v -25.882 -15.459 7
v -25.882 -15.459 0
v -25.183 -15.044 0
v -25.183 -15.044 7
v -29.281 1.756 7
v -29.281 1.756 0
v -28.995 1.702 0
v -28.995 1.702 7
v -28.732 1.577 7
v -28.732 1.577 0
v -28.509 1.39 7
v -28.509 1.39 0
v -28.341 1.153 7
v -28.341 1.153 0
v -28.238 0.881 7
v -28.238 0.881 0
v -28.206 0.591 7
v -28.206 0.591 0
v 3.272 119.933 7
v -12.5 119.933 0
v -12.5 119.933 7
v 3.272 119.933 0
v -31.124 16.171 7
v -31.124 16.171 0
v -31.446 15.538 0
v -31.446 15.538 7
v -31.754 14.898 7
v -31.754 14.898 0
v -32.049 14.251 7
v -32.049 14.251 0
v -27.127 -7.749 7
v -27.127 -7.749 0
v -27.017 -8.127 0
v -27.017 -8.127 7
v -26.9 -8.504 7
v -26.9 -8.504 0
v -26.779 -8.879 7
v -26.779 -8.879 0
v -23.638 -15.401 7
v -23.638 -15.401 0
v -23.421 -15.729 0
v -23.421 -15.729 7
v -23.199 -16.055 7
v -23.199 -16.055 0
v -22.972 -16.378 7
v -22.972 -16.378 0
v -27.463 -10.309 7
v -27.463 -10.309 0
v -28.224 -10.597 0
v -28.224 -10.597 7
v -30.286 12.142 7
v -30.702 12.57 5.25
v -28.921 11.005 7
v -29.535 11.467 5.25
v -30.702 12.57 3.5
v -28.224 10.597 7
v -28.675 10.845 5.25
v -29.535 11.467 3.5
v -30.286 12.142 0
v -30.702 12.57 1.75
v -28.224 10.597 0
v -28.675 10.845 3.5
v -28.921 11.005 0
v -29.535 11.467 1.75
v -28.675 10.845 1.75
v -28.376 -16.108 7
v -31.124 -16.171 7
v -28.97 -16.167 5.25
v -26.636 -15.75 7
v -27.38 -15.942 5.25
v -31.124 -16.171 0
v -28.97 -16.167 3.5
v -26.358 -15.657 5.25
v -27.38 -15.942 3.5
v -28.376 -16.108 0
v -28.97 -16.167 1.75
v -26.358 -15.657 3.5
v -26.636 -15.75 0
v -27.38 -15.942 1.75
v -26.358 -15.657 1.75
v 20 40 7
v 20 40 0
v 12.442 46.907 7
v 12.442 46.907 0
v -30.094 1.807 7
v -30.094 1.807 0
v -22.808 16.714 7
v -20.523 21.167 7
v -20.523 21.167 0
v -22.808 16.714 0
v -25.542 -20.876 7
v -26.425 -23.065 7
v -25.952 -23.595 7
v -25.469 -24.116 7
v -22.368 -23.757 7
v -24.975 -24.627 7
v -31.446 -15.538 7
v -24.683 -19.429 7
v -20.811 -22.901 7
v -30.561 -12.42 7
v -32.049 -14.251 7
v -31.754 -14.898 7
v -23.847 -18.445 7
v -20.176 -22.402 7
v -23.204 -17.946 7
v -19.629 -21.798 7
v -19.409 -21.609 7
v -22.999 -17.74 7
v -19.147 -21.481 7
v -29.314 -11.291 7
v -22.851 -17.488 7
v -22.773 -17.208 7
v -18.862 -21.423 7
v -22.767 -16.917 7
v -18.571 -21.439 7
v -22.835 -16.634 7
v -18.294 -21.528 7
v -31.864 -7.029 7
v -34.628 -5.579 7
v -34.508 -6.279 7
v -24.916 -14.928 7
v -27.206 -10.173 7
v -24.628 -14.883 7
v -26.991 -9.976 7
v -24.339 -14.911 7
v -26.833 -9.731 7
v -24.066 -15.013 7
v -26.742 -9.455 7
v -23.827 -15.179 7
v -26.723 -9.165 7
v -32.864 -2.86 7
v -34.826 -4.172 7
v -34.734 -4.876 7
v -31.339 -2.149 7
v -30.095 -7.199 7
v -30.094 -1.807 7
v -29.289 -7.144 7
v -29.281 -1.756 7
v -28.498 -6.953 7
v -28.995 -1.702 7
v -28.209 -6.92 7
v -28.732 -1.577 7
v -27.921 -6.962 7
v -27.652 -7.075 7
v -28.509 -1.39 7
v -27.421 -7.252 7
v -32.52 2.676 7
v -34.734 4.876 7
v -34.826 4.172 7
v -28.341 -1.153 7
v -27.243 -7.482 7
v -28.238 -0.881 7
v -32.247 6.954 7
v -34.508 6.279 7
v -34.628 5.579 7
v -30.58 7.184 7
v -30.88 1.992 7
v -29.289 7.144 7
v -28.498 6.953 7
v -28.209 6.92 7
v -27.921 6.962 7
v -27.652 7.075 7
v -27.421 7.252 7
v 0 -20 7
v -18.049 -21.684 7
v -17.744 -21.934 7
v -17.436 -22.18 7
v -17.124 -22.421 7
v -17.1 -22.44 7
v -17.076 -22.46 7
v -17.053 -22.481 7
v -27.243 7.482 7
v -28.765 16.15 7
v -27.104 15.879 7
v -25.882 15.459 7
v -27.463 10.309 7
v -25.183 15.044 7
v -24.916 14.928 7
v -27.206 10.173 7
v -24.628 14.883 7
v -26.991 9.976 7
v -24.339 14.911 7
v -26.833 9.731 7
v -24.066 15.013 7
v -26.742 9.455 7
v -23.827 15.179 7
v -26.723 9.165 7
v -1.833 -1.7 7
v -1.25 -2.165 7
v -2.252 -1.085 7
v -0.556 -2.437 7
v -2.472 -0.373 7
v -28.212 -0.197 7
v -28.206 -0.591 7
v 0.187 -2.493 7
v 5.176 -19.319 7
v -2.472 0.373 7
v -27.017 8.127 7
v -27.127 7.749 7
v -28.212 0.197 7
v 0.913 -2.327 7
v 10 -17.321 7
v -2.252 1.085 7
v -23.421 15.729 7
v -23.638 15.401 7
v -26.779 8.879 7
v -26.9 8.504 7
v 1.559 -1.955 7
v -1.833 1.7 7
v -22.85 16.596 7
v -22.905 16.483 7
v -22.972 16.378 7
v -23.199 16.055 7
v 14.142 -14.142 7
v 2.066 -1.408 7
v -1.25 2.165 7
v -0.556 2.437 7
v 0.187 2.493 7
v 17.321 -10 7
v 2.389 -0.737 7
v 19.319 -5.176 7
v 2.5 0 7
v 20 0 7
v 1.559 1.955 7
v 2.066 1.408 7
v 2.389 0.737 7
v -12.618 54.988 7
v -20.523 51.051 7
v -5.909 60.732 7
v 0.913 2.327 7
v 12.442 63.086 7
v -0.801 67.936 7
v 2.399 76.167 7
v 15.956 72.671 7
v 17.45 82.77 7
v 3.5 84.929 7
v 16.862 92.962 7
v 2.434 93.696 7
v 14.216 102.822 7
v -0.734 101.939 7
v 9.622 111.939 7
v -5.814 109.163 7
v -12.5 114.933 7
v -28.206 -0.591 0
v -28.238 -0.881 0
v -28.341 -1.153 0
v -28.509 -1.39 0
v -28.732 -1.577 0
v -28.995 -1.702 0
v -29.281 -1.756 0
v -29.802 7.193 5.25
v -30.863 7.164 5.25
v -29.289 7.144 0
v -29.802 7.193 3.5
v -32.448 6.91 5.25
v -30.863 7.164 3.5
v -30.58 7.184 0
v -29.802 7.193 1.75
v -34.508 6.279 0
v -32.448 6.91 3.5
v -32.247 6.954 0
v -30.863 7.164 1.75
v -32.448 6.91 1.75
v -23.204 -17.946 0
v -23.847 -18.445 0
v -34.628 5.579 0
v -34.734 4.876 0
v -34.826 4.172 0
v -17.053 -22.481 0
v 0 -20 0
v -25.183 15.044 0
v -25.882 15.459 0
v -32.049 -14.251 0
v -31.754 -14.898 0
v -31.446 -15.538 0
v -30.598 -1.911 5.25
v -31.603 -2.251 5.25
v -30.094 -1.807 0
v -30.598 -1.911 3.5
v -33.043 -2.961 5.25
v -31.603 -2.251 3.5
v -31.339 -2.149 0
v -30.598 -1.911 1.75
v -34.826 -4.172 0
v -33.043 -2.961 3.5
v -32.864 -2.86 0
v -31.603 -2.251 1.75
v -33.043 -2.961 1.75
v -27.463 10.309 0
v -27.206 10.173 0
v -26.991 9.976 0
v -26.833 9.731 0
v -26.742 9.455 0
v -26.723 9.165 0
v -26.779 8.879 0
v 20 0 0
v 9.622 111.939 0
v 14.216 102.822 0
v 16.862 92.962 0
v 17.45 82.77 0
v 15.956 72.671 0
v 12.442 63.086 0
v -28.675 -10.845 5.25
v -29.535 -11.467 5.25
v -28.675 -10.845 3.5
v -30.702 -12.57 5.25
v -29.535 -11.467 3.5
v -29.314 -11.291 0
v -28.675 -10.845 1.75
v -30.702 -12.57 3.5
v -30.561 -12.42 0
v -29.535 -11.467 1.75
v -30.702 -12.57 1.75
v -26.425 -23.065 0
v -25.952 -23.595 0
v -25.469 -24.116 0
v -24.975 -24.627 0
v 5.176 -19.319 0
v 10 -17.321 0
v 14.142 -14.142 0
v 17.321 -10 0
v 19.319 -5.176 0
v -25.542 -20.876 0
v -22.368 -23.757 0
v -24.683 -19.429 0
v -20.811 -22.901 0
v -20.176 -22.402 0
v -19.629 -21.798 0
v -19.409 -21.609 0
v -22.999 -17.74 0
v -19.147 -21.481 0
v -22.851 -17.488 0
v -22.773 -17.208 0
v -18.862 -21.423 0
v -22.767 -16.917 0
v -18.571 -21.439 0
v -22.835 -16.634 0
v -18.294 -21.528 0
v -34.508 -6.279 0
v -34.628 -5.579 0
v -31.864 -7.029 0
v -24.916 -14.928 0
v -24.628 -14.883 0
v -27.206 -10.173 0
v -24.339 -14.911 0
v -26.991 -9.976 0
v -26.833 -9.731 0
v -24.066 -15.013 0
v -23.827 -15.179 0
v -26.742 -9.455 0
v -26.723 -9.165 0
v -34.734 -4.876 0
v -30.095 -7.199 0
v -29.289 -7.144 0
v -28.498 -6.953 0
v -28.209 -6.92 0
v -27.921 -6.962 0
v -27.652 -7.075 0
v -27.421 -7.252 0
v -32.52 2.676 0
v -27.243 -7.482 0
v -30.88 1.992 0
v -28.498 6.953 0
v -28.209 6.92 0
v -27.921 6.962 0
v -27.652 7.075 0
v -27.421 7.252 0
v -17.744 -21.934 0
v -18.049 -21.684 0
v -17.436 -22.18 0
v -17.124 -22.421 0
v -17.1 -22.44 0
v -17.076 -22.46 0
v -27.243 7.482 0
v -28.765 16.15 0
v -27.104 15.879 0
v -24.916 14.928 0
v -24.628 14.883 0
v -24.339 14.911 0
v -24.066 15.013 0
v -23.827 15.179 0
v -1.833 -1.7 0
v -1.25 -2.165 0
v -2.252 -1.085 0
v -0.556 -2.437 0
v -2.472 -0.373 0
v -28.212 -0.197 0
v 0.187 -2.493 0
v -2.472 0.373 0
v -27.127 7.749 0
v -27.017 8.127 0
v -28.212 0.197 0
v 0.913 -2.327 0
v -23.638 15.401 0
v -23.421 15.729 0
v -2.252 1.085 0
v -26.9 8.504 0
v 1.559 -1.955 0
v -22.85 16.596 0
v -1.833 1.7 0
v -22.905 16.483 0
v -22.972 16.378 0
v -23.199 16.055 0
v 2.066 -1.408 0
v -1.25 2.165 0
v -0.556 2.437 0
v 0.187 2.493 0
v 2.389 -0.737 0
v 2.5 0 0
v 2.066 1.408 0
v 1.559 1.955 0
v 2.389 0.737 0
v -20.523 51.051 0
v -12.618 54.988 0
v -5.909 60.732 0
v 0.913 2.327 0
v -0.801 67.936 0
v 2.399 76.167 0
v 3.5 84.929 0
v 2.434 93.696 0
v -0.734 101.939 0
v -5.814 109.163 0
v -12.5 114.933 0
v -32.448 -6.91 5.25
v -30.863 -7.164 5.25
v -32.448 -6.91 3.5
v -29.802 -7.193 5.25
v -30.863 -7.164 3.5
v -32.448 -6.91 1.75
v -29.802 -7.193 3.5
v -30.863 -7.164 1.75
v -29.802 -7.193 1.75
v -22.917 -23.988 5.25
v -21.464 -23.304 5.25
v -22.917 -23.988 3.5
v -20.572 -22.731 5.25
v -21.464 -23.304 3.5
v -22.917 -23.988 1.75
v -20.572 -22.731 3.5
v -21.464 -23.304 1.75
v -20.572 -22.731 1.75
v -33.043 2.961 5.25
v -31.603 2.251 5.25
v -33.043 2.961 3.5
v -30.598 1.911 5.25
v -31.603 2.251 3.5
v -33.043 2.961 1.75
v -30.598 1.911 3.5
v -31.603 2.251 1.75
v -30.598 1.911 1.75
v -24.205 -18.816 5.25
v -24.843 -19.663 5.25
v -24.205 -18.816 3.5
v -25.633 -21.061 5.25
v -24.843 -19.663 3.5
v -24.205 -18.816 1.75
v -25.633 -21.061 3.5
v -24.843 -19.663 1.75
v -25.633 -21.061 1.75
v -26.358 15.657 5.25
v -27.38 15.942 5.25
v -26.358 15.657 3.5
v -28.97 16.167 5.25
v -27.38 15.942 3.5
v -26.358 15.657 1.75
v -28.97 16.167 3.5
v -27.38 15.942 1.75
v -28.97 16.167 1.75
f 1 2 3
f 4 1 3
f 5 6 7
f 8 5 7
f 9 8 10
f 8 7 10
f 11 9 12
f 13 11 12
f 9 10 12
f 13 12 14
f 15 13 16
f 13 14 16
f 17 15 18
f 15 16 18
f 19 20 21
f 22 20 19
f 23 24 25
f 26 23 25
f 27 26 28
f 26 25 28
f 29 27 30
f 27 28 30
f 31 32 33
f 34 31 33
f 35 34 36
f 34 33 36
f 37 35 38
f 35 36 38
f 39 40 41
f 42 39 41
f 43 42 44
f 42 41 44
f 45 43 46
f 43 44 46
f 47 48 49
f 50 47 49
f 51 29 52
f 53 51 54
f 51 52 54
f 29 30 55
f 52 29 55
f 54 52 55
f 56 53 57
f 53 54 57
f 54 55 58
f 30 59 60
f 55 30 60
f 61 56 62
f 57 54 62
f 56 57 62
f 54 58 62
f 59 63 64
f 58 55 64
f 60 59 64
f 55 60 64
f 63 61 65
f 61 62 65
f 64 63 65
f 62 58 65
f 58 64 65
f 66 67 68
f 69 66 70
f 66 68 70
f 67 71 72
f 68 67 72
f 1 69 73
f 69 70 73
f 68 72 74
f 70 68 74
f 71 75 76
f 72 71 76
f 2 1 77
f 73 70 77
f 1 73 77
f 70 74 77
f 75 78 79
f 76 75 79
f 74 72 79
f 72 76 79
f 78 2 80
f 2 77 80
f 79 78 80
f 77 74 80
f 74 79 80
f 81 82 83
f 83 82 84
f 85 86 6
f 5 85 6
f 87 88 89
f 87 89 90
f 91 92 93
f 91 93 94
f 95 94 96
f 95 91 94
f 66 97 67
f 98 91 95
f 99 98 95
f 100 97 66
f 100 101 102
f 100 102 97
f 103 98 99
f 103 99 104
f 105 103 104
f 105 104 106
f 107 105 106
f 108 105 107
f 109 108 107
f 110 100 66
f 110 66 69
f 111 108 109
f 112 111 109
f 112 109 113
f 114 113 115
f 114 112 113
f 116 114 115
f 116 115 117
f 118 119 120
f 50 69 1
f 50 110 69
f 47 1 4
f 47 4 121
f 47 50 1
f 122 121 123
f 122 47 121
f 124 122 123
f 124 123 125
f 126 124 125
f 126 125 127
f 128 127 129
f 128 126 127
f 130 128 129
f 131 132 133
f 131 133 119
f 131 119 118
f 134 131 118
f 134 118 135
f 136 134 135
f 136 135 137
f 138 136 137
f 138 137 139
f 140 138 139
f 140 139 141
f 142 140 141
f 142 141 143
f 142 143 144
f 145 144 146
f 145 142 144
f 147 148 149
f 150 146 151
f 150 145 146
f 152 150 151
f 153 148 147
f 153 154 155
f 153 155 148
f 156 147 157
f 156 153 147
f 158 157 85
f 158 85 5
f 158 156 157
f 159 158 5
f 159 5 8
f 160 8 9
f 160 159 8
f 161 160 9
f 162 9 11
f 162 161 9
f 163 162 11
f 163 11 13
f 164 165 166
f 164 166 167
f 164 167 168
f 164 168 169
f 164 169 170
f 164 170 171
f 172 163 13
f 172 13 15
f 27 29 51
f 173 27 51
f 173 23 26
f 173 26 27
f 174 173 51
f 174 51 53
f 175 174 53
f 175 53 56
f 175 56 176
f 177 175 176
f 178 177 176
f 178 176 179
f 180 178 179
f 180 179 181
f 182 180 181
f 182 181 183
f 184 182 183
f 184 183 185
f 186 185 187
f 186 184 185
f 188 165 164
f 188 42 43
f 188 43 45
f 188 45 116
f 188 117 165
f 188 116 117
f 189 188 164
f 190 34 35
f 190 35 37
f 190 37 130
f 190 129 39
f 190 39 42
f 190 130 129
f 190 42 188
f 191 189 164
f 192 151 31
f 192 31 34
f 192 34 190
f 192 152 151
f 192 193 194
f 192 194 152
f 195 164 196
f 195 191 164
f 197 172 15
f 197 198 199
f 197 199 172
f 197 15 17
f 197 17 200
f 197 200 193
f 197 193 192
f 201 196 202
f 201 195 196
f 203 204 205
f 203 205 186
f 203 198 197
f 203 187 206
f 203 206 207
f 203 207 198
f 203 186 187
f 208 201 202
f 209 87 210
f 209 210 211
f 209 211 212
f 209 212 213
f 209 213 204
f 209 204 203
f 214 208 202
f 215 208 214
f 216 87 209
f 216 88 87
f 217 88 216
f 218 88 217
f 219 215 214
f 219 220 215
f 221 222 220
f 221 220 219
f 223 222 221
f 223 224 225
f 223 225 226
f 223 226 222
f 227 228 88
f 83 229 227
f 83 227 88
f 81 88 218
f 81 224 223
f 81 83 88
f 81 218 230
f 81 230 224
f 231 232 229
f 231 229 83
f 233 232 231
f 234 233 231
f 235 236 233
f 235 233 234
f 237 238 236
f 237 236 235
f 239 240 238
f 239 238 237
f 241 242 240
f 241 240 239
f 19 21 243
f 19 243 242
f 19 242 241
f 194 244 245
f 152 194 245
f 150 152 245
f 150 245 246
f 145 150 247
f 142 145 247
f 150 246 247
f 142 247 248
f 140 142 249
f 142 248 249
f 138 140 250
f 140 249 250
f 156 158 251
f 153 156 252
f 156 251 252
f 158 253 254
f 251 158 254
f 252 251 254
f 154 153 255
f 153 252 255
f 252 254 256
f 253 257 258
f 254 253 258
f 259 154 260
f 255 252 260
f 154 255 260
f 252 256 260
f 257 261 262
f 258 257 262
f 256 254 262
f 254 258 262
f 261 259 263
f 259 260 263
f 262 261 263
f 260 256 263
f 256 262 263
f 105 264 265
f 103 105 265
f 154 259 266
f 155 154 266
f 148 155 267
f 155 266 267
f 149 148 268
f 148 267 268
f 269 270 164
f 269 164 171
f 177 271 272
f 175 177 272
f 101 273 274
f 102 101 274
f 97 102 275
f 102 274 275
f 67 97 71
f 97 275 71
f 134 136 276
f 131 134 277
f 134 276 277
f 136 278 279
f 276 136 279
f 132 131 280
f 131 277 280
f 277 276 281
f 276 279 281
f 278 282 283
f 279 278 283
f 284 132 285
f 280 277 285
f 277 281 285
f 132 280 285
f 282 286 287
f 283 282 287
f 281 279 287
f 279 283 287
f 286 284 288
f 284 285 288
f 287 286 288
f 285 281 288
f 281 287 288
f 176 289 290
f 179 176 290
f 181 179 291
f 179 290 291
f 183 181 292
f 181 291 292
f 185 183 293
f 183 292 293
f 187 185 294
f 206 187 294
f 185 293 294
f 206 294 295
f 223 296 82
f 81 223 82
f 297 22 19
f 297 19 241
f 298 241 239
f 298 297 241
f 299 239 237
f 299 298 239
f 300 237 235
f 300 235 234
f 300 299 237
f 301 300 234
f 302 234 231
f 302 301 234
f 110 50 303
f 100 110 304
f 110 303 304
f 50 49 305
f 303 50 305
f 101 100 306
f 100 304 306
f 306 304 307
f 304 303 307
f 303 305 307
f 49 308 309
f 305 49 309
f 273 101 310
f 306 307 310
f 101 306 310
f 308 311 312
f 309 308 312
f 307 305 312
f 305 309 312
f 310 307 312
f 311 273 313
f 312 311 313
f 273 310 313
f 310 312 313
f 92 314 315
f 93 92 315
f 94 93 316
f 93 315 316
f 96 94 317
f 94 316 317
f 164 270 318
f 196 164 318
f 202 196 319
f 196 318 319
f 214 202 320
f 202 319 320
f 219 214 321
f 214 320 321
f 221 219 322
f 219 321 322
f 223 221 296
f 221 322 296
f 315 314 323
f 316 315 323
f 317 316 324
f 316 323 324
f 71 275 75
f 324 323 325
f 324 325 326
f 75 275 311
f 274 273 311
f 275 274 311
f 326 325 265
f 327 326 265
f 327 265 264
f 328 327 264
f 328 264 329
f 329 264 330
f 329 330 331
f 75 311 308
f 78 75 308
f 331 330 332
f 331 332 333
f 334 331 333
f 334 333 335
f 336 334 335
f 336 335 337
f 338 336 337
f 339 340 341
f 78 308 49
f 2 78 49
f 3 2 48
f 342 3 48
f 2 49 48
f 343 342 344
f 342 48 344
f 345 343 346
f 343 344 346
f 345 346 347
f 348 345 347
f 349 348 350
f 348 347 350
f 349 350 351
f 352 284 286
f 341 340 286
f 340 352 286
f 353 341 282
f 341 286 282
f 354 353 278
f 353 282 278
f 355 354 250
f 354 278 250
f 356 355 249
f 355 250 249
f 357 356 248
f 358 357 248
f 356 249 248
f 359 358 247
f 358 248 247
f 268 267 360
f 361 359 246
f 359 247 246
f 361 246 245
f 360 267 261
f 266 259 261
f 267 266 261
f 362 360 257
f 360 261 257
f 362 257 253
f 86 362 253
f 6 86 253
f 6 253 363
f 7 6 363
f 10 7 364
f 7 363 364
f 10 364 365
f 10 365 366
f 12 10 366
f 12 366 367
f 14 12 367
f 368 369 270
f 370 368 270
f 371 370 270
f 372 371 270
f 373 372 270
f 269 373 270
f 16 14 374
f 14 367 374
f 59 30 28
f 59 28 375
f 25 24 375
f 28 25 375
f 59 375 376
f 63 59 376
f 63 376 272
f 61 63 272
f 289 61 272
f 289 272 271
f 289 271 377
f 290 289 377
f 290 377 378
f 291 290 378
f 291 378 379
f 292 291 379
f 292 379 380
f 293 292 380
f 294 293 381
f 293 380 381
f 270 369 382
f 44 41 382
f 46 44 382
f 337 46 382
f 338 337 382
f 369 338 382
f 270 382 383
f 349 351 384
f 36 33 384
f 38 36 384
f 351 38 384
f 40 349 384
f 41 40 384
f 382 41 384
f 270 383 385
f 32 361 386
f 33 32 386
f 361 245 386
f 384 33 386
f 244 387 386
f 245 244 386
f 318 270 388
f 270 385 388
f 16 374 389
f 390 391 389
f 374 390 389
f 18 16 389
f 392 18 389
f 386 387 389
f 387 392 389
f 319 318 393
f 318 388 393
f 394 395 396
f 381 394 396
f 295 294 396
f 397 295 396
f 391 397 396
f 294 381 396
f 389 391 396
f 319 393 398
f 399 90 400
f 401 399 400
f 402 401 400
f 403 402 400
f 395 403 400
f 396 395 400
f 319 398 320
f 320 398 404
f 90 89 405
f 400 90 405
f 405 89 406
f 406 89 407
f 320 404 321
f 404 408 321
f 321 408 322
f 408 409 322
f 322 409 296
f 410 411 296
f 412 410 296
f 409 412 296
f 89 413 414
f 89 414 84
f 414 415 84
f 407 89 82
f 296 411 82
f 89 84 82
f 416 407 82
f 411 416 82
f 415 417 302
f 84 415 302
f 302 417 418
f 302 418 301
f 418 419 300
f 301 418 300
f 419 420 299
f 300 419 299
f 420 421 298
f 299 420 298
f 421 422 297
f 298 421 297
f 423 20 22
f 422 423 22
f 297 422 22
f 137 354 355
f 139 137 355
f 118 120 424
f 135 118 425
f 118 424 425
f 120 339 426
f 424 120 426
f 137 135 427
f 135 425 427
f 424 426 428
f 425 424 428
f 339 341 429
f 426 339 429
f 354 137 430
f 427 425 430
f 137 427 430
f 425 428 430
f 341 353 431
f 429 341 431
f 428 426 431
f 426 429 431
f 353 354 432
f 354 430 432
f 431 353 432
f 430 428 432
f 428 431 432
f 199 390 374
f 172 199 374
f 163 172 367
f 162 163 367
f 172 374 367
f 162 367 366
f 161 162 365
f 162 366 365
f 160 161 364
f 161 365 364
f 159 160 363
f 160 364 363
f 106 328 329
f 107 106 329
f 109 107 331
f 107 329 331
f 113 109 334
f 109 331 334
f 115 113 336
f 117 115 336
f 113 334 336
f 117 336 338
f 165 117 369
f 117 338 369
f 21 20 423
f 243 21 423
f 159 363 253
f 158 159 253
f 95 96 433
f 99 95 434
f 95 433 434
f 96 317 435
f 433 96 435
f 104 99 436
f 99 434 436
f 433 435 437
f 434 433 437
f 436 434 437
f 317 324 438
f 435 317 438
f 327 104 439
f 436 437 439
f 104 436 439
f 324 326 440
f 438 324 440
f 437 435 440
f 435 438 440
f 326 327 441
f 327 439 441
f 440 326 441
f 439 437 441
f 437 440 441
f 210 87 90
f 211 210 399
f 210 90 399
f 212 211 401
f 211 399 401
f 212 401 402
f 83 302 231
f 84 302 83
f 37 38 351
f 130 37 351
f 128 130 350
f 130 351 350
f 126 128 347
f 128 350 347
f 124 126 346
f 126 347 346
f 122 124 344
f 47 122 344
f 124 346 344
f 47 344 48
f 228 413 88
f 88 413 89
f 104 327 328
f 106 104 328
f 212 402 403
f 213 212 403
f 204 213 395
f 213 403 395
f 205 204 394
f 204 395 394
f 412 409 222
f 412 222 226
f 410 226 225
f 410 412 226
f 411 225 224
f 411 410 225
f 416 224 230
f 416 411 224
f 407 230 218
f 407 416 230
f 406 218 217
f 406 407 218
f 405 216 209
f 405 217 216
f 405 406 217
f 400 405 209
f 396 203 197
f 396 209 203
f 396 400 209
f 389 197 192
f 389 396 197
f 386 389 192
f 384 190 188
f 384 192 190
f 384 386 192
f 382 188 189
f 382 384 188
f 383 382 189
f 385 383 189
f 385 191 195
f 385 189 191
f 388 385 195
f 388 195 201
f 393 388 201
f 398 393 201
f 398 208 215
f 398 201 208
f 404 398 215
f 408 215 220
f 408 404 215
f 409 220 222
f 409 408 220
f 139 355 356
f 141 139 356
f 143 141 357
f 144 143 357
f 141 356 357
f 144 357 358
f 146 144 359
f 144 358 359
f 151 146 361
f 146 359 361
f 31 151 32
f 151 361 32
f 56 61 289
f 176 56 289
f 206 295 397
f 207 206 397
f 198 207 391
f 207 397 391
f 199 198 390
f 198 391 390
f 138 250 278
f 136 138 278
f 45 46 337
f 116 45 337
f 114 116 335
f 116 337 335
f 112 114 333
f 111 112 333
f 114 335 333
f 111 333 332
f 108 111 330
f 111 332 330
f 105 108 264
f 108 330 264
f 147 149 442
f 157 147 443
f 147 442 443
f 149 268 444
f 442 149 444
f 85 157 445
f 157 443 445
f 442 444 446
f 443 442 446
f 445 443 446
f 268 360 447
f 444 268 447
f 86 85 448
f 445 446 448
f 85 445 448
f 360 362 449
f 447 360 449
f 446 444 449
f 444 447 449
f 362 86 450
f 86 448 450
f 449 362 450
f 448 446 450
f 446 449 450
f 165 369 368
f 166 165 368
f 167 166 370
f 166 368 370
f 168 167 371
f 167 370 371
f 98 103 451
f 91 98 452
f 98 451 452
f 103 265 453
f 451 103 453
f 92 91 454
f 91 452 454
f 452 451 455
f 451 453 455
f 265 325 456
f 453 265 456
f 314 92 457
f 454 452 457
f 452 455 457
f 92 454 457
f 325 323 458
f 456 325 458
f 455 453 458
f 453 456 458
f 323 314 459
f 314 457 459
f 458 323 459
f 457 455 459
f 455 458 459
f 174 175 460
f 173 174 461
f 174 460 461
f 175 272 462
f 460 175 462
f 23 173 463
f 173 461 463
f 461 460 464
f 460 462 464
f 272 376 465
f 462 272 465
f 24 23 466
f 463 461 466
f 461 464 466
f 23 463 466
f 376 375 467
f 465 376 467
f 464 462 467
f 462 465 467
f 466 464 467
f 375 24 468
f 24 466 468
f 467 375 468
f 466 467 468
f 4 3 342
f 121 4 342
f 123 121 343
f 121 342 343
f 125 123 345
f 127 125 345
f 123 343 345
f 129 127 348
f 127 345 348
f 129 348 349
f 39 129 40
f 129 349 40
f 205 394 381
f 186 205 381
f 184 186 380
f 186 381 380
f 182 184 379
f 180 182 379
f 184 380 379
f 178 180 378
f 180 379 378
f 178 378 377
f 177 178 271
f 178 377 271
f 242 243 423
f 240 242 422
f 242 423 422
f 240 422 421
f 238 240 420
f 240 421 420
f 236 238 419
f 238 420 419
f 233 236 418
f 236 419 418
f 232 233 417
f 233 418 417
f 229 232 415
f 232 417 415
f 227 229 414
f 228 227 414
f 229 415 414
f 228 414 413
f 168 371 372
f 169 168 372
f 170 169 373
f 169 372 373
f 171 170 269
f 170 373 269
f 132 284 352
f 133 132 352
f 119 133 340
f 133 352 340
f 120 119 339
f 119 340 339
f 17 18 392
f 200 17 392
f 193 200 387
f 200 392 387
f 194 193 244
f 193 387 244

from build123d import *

# Parameters (mm, degrees)
PAD005_DEPTH      = 10
CYLINDER001_R     = 2.5
CYLINDER001_DEPTH = 30
PAD_DEPTH         = 7
PAD001_DEPTH      = 7


with BuildPart() as gearcutter_d:
    # Sketch007 → Pad005 (new body)
    with BuildSketch(Plane.XY):
        with BuildLine():
            Line((20, 31.95888), (45.304215, 31.95888))
            Line((45.304215, 31.95888), (45.304215, -33.652056))
            Line((45.304215, -33.652056), (23.213182, -33.652056))
            Line((-17.372387, -39.01239), (23.213182, -33.652056))
            Line((-25.984375, -33.578197), (-17.372387, -39.01239))
            Line((-17.23691, -22.507347), (-25.984375, -33.578197))
            Line((7e-06, -20), (-17.23691, -22.507347))
            ThreePointArc((7e-06, -20), (14.142138, -14.142133), (20, 0))
            Line((20, 0), (20, 31.95888))
        make_face()
        Polygon((-20, 22.185684), (-22.978563, 16.381247), (-30, 23.81991), (-24.00174, 30), align=None)
    extrude(amount=PAD005_DEPTH)


with BuildPart() as hole:
    # Cylinder001 → Cylinder001 (new body)
    with BuildSketch(Plane.XY.offset(-10)):
        Circle(CYLINDER001_R)
    extrude(amount=CYLINDER001_DEPTH)


with BuildPart() as cut002:
    # InvoluteGear → Pad (new body)
    with BuildSketch(Plane.XY):
        with BuildLine():
            Line((29.216017, -2.627852), (30.02668, -2.698596))
            add(Edge.make_bspline(
                [(30.02668, -2.698596), (30.269336, -2.702327), (31.240634, -2.684194), (32.940327, -2.265756), (35.058609, -1.065575)],
                knots=[0, 0, 0, 0, 0, 1, 1, 1, 1, 1], degree=4))
            ThreePointArc((35.058609, -1.065575), (35.074799, 0), (35.058609, 1.065575))
            add(Edge.make_bspline(
                [(35.058609, 1.065575), (32.940327, 2.265756), (31.240634, 2.684194), (30.269336, 2.702327), (30.02668, 2.698596)],
                knots=[0, 0, 0, 0, 0, 1, 1, 1, 1, 1], degree=4))
            Line((30.02668, 2.698596), (29.216017, 2.627852))
            ThreePointArc((29.216017, 2.627852), (28.398075, 2.874673), (27.979368, 3.61941))
            ThreePointArc((27.979368, 3.61941), (27.89739, 4.204855), (27.803163, 4.788454))
            ThreePointArc((27.803163, 4.788454), (27.983753, 5.62352), (28.692604, 6.100468))
            Line((28.692604, 6.100468), (29.488104, 6.271815))
            add(Edge.make_bspline(
                [(29.488104, 6.271815), (29.72108, 6.339774), (30.64388, 6.643396), (32.144724, 7.544237), (33.815137, 9.315472)],
                knots=[0, 0, 0, 0, 0, 1, 1, 1, 1, 1], degree=4))
            ThreePointArc((33.815137, 9.315472), (33.516524, 10.338478), (33.18697, 11.351941))
            add(Edge.make_bspline(
                [(33.18697, 11.351941), (30.809038, 11.874427), (29.06152, 11.773281), (28.12803, 11.504313), (27.897254, 11.429224)],
                knots=[0, 0, 0, 0, 0, 1, 1, 1, 1, 1], degree=4))
            Line((27.897254, 11.429224), (27.143458, 11.122676))
            ThreePointArc((27.143458, 11.122676), (26.289104, 11.117439), (25.669483, 11.705673))
            ThreePointArc((25.669483, 11.705673), (25.418584, 12.240945), (25.156525, 12.770842))
            ThreePointArc((25.156525, 12.770842), (25.082952, 13.622039), (25.619728, 14.286735))
            Line((25.619728, 14.286735), (26.32938, 14.684947))
            add(Edge.make_bspline(
                [(26.32938, 14.684947), (26.531974, 14.818557), (27.324283, 15.380691), (28.492921, 16.683892), (29.567042, 18.868799)],
                knots=[0, 0, 0, 0, 0, 1, 1, 1, 1, 1], degree=4))
            ThreePointArc((29.567042, 18.868799), (28.980159, 19.758338), (28.366523, 20.629637))
            add(Edge.make_bspline(
                [(28.366523, 20.629637), (25.94023, 20.428003), (24.300163, 19.816261), (23.487425, 19.284092), (23.289034, 19.144315)],
                knots=[0, 0, 0, 0, 0, 1, 1, 1, 1, 1], degree=4))
            Line((23.289034, 19.144315), (22.659084, 18.629202))
            ThreePointArc((22.659084, 18.629202), (21.84423, 18.372372), (21.078752, 18.751836))
            ThreePointArc((21.078752, 18.751836), (20.681226, 19.189373), (20.274619, 19.618485))
            ThreePointArc((20.274619, 19.618485), (19.95342, 20.41018), (20.270426, 21.203563))
            Line((20.270426, 21.203563), (20.831176, 21.793257))
            add(Edge.make_bspline(
                [(20.831176, 21.793257), (20.985387, 21.980647), (21.576804, 22.751344), (22.309397, 24.341109), (22.691785, 26.745549)],
                knots=[0, 0, 0, 0, 0, 1, 1, 1, 1, 1], degree=4))
            ThreePointArc((22.691785, 26.745549), (21.868779, 27.422582), (21.025585, 28.074299))
            add(Edge.make_bspline(
                [(21.025585, 28.074299), (18.766519, 27.166461), (17.37963, 26.098479), (16.759858, 25.350393), (16.611482, 25.15835)],
                knots=[0, 0, 0, 0, 0, 1, 1, 1, 1, 1], degree=4))
            Line((16.611482, 25.15835), (16.161351, 24.480441))
            ThreePointArc((16.161351, 24.480441), (15.4584, 23.994839), (14.615082, 24.131816))
            ThreePointArc((14.615082, 24.131816), (14.10625, 24.432742), (13.591225, 24.72294))
            ThreePointArc((13.591225, 24.72294), (13.05094, 25.384787), (13.120008, 26.236361))
            Line((13.120008, 26.236361), (13.48203, 26.96514))
            add(Edge.make_bspline(
                [(13.48203, 26.96514), (13.574155, 27.18966), (13.912131, 28.10044), (14.143586, 29.835512), (13.800264, 32.245841)],
                knots=[0, 0, 0, 0, 0, 1, 1, 1, 1, 1], degree=4))
            ThreePointArc((13.800264, 32.245841), (12.814263, 32.65021), (11.816433, 33.024437))
            add(Edge.make_bspline(
                [(11.816433, 33.024437), (9.92532, 31.49106), (8.91484, 30.061732), (8.543105, 29.164202), (8.457926, 28.936956)],
                knots=[0, 0, 0, 0, 0, 1, 1, 1, 1, 1], degree=4))
            Line((8.457926, 28.936956), (8.227611, 28.156485))
            ThreePointArc((8.227611, 28.156485), (7.699024, 27.485259), (6.852797, 27.367578))
            ThreePointArc((6.852797, 27.367578), (6.277872, 27.505154), (5.70019, 27.630653))
            ThreePointArc((5.70019, 27.630653), (4.988826, 28.103844), (4.80382, 28.937943))
            Line((4.80382, 28.937943), (4.934946, 29.741053))
            add(Edge.make_bspline(
                [(4.934946, 29.741053), (4.956801, 29.982752), (5.011304, 30.952689), (4.721054, 32.678899), (3.682528, 34.880948)],
                knots=[0, 0, 0, 0, 0, 1, 1, 1, 1, 1], degree=4))
            ThreePointArc((3.682528, 34.880948), (2.621143, 34.976723), (1.557338, 35.040209))
            add(Edge.make_bspline(
                [(1.557338, 35.040209), (0.202213, 33.01754), (-0.342073, 31.353869), (-0.43274, 30.386642), (-0.447153, 30.144385)],
                knots=[0, 0, 0, 0, 0, 1, 1, 1, 1, 1], degree=4))
            Line((-0.447153, 30.144385), (-0.437188, 29.330703))
            ThreePointArc((-0.437188, 29.330703), (-0.744444, 28.533493), (-1.518389, 28.171611))
            ThreePointArc((-1.518389, 28.171611), (-2.108323, 28.133612), (-2.697331, 28.083261))
            ThreePointArc((-2.697331, 28.083261), (-3.516567, 28.325751), (-3.939209, 29.068262))
            Line((-3.939209, 29.068262), (-4.050629, 29.874342))
            add(Edge.make_bspline(
                [(-4.050629, 29.874342), (-4.100987, 30.111745), (-4.3348, 31.054656), (-5.120964, 32.618623), (-6.762416, 34.416729)],
                knots=[0, 0, 0, 0, 0, 1, 1, 1, 1, 1], degree=4))
            ThreePointArc((-6.762416, 34.416729), (-7.804877, 34.195401), (-8.840133, 33.942504))
            add(Edge.make_bspline(
                [(-8.840133, 33.942504), (-9.538861, 31.610267), (-9.56859, 29.860077), (-9.370135, 28.909097), (-9.312501, 28.673354)],
                knots=[0, 0, 0, 0, 0, 1, 1, 1, 1, 1], degree=4))
            Line((-9.312501, 28.673354), (-9.063142, 27.898758))
            ThreePointArc((-9.063142, 27.898758), (-9.121765, 27.046401), (-9.754659, 26.472472))
            ThreePointArc((-9.754659, 26.472472), (-10.307184, 26.262276), (-10.855183, 26.040548))
            ThreePointArc((-10.855183, 26.040548), (-11.709498, 26.030791), (-12.332222, 26.615739))
            Line((-12.332222, 26.615739), (-12.676288, 27.353165))
            add(Edge.make_bspline(
                [(-12.676288, 27.353165), (-12.794385, 27.565178), (-13.295737, 28.39728), (-14.507962, 29.660038), (-16.60649, 30.894434)],
                knots=[0, 0, 0, 0, 0, 1, 1, 1, 1, 1], degree=4))
            ThreePointArc((-16.60649, 30.894434), (-17.537399, 30.375667), (-18.452119, 29.828859))
            add(Edge.make_bspline(
                [(-18.452119, 29.828859), (-18.432366, 27.394282), (-17.944897, 25.713086), (-17.474952, 24.862851), (-17.350392, 24.65457)],
                knots=[0, 0, 0, 0, 0, 1, 1, 1, 1, 1], degree=4))
            Line((-17.350392, 24.65457), (-16.883795, 23.987887))
            ThreePointArc((-16.883795, 23.987887), (-16.688578, 23.156118), (-17.124185, 22.421138))
            ThreePointArc((-17.124185, 22.421138), (-17.590206, 22.057421), (-18.048504, 21.684019))
            ThreePointArc((-18.048504, 21.684019), (-18.861988, 21.422881), (-19.629463, 21.79829))
            Line((-19.629463, 21.79829), (-20.175603, 22.401539))
            add(Edge.make_bspline(
                [(-20.175603, 22.401539), (-20.350945, 22.569323), (-21.07529, 23.216681), (-22.605863, 24.066029), (-24.975004, 24.627032)],
                knots=[0, 0, 0, 0, 0, 1, 1, 1, 1, 1], degree=4))
            ThreePointArc((-24.975004, 24.627032), (-25.711647, 23.856922), (-26.424554, 23.064789))
            add(Edge.make_bspline(
                [(-26.424554, 23.064789), (-25.688074, 20.744196), (-24.726721, 19.281374), (-24.027043, 18.607432), (-23.846625, 18.445118)],
                knots=[0, 0, 0, 0, 0, 1, 1, 1, 1, 1], degree=4))
            Line((-23.846625, 18.445118), (-23.204249, 17.945586))
            ThreePointArc((-23.204249, 17.945586), (-22.772537, 17.208312), (-22.972152, 16.377588))
            ThreePointArc((-22.972152, 16.377588), (-23.310261, 15.892667), (-23.638136, 15.400768))
            ThreePointArc((-23.638136, 15.400768), (-24.338508, 14.911454), (-25.182539, 15.043968))
            Line((-25.182539, 15.043968), (-25.882227, 15.459439))
            add(Edge.make_bspline(
                [(-25.882227, 15.459439), (-26.099234, 15.568085), (-26.982211, 15.973178), (-28.695135, 16.333648), (-31.12438, 16.17141)],
                knots=[0, 0, 0, 0, 0, 1, 1, 1, 1, 1], degree=4))
            ThreePointArc((-31.12438, 16.17141), (-31.601302, 15.218385), (-32.049051, 14.251311))
            add(Edge.make_bspline(
                [(-32.049051, 14.251311), (-30.661284, 12.250897), (-29.311467, 11.136428), (-28.444225, 10.698661), (-28.22398, 10.596737)],
                knots=[0, 0, 0, 0, 0, 1, 1, 1, 1, 1], degree=4))
            Line((-28.22398, 10.596737), (-27.462904, 10.308742))
            ThreePointArc((-27.462904, 10.308742), (-26.833056, 9.731472), (-26.778943, 8.878817))
            ThreePointArc((-26.778943, 8.878817), (-26.959098, 8.31578), (-27.127416, 7.749093))
            ThreePointArc((-27.127416, 7.749093), (-27.652445, 7.075079), (-28.498037, 6.952923))
            Line((-28.498037, 6.952923), (-29.289102, 7.143699))
            add(Edge.make_bspline(
                [(-29.289102, 7.143699), (-29.528492, 7.183554), (-30.491644, 7.310388), (-32.234718, 7.14995), (-34.508218, 6.278888)],
                knots=[0, 0, 0, 0, 0, 1, 1, 1, 1, 1], degree=4))
            ThreePointArc((-34.508218, 6.278888), (-34.683042, 5.227628), (-34.825849, 4.171541))
            add(Edge.make_bspline(
                [(-34.825849, 4.171541), (-32.910105, 2.669052), (-31.29176, 2.001961), (-30.334014, 1.839267), (-30.093511, 1.80679)],
                knots=[0, 0, 0, 0, 0, 1, 1, 1, 1, 1], degree=4))
            Line((-30.093511, 1.80679), (-29.281359, 1.75592))
            ThreePointArc((-29.281359, 1.75592), (-28.50934, 1.389948), (-28.206307, 0.591124))
            ThreePointArc((-28.206307, 0.591124), (-28.2125, 0), (-28.206307, -0.591124))
            ThreePointArc((-28.206307, -0.591124), (-28.50934, -1.389948), (-29.281359, -1.75592))
            Line((-29.281359, -1.75592), (-30.093511, -1.80679))
            add(Edge.make_bspline(
                [(-30.093511, -1.80679), (-30.334014, -1.839267), (-31.29176, -2.001961), (-32.910105, -2.669052), (-34.825849, -4.171541)],
                knots=[0, 0, 0, 0, 0, 1, 1, 1, 1, 1], degree=4))
            ThreePointArc((-34.825849, -4.171541), (-34.683042, -5.227628), (-34.508218, -6.278888))
            add(Edge.make_bspline(
                [(-34.508218, -6.278888), (-32.234718, -7.14995), (-30.491644, -7.310388), (-29.528492, -7.183554), (-29.289102, -7.143699)],
                knots=[0, 0, 0, 0, 0, 1, 1, 1, 1, 1], degree=4))
            Line((-29.289102, -7.143699), (-28.498037, -6.952923))
            ThreePointArc((-28.498037, -6.952923), (-27.652445, -7.075079), (-27.127416, -7.749093))
            ThreePointArc((-27.127416, -7.749093), (-26.959098, -8.31578), (-26.778943, -8.878817))
            ThreePointArc((-26.778943, -8.878817), (-26.833056, -9.731472), (-27.462904, -10.308742))
            Line((-27.462904, -10.308742), (-28.22398, -10.596737))
            add(Edge.make_bspline(
                [(-28.22398, -10.596737), (-28.444225, -10.698661), (-29.311467, -11.136428), (-30.661284, -12.250897), (-32.049051, -14.251311)],
                knots=[0, 0, 0, 0, 0, 1, 1, 1, 1, 1], degree=4))
            ThreePointArc((-32.049051, -14.251311), (-31.601302, -15.218385), (-31.12438, -16.17141))
            add(Edge.make_bspline(
                [(-31.12438, -16.17141), (-28.695135, -16.333648), (-26.982211, -15.973178), (-26.099234, -15.568085), (-25.882227, -15.459439)],
                knots=[0, 0, 0, 0, 0, 1, 1, 1, 1, 1], degree=4))
            Line((-25.882227, -15.459439), (-25.182539, -15.043968))
            ThreePointArc((-25.182539, -15.043968), (-24.338508, -14.911454), (-23.638136, -15.400768))
            ThreePointArc((-23.638136, -15.400768), (-23.310261, -15.892667), (-22.972152, -16.377588))
            ThreePointArc((-22.972152, -16.377588), (-22.772537, -17.208312), (-23.204249, -17.945586))
            Line((-23.204249, -17.945586), (-23.846625, -18.445118))
            add(Edge.make_bspline(
                [(-23.846625, -18.445118), (-24.027043, -18.607432), (-24.726721, -19.281374), (-25.688074, -20.744196), (-26.424554, -23.064789)],
                knots=[0, 0, 0, 0, 0, 1, 1, 1, 1, 1], degree=4))
            ThreePointArc((-26.424554, -23.064789), (-25.711647, -23.856922), (-24.975004, -24.627032))
            add(Edge.make_bspline(
                [(-24.975004, -24.627032), (-22.605863, -24.066029), (-21.07529, -23.216681), (-20.350945, -22.569323), (-20.175603, -22.401539)],
                knots=[0, 0, 0, 0, 0, 1, 1, 1, 1, 1], degree=4))
            Line((-20.175603, -22.401539), (-19.629463, -21.79829))
            ThreePointArc((-19.629463, -21.79829), (-18.861988, -21.422881), (-18.048504, -21.684019))
            ThreePointArc((-18.048504, -21.684019), (-17.590206, -22.057421), (-17.124185, -22.421138))
            ThreePointArc((-17.124185, -22.421138), (-16.688578, -23.156118), (-16.883795, -23.987887))
            Line((-16.883795, -23.987887), (-17.350392, -24.65457))
            add(Edge.make_bspline(
                [(-17.350392, -24.65457), (-17.474952, -24.862851), (-17.944897, -25.713086), (-18.432366, -27.394282), (-18.452119, -29.828859)],
                knots=[0, 0, 0, 0, 0, 1, 1, 1, 1, 1], degree=4))
            ThreePointArc((-18.452119, -29.828859), (-17.537399, -30.375667), (-16.60649, -30.894434))
            add(Edge.make_bspline(
                [(-16.60649, -30.894434), (-14.507962, -29.660038), (-13.295737, -28.39728), (-12.794385, -27.565178), (-12.676288, -27.353165)],
                knots=[0, 0, 0, 0, 0, 1, 1, 1, 1, 1], degree=4))
            Line((-12.676288, -27.353165), (-12.332222, -26.615739))
            ThreePointArc((-12.332222, -26.615739), (-11.709498, -26.030791), (-10.855183, -26.040548))
            ThreePointArc((-10.855183, -26.040548), (-10.307184, -26.262276), (-9.754659, -26.472472))
            ThreePointArc((-9.754659, -26.472472), (-9.121765, -27.046401), (-9.063142, -27.898758))
            Line((-9.063142, -27.898758), (-9.312501, -28.673354))
            add(Edge.make_bspline(
                [(-9.312501, -28.673354), (-9.370135, -28.909097), (-9.56859, -29.860077), (-9.538861, -31.610267), (-8.840133, -33.942504)],
                knots=[0, 0, 0, 0, 0, 1, 1, 1, 1, 1], degree=4))
            ThreePointArc((-8.840133, -33.942504), (-7.804877, -34.195401), (-6.762416, -34.416729))
            add(Edge.make_bspline(
                [(-6.762416, -34.416729), (-5.120964, -32.618623), (-4.3348, -31.054656), (-4.100987, -30.111745), (-4.050629, -29.874342)],
                knots=[0, 0, 0, 0, 0, 1, 1, 1, 1, 1], degree=4))
            Line((-4.050629, -29.874342), (-3.939209, -29.068262))
            ThreePointArc((-3.939209, -29.068262), (-3.516567, -28.325751), (-2.697331, -28.083261))
            ThreePointArc((-2.697331, -28.083261), (-2.108323, -28.133612), (-1.518389, -28.171611))
            ThreePointArc((-1.518389, -28.171611), (-0.744444, -28.533493), (-0.437188, -29.330703))
            Line((-0.437188, -29.330703), (-0.447153, -30.144385))
            add(Edge.make_bspline(
                [(-0.447153, -30.144385), (-0.43274, -30.386642), (-0.342073, -31.353869), (0.202213, -33.01754), (1.557338, -35.040209)],
                knots=[0, 0, 0, 0, 0, 1, 1, 1, 1, 1], degree=4))
            ThreePointArc((1.557338, -35.040209), (2.621143, -34.976723), (3.682528, -34.880948))
            add(Edge.make_bspline(
                [(3.682528, -34.880948), (4.721054, -32.678899), (5.011304, -30.952689), (4.956801, -29.982752), (4.934946, -29.741053)],
                knots=[0, 0, 0, 0, 0, 1, 1, 1, 1, 1], degree=4))
            Line((4.934946, -29.741053), (4.80382, -28.937943))
            ThreePointArc((4.80382, -28.937943), (4.988826, -28.103844), (5.70019, -27.630653))
            ThreePointArc((5.70019, -27.630653), (6.277872, -27.505154), (6.852797, -27.367578))
            ThreePointArc((6.852797, -27.367578), (7.699024, -27.485259), (8.227611, -28.156485))
            Line((8.227611, -28.156485), (8.457926, -28.936956))
            add(Edge.make_bspline(
                [(8.457926, -28.936956), (8.543105, -29.164202), (8.91484, -30.061732), (9.92532, -31.49106), (11.816433, -33.024437)],
                knots=[0, 0, 0, 0, 0, 1, 1, 1, 1, 1], degree=4))
            ThreePointArc((11.816433, -33.024437), (12.814263, -32.65021), (13.800264, -32.245841))
            add(Edge.make_bspline(
                [(13.800264, -32.245841), (14.143586, -29.835512), (13.912131, -28.10044), (13.574155, -27.18966), (13.48203, -26.96514)],
                knots=[0, 0, 0, 0, 0, 1, 1, 1, 1, 1], degree=4))
            Line((13.48203, -26.96514), (13.120008, -26.236361))
            ThreePointArc((13.120008, -26.236361), (13.05094, -25.384787), (13.591225, -24.72294))
            ThreePointArc((13.591225, -24.72294), (14.10625, -24.432742), (14.615082, -24.131816))
            ThreePointArc((14.615082, -24.131816), (15.4584, -23.994839), (16.161351, -24.480441))
            Line((16.161351, -24.480441), (16.611482, -25.15835))
            add(Edge.make_bspline(
                [(16.611482, -25.15835), (16.759858, -25.350393), (17.37963, -26.098479), (18.766519, -27.166461), (21.025585, -28.074299)],
                knots=[0, 0, 0, 0, 0, 1, 1, 1, 1, 1], degree=4))
            ThreePointArc((21.025585, -28.074299), (21.868779, -27.422582), (22.691785, -26.745549))
            add(Edge.make_bspline(
                [(22.691785, -26.745549), (22.309397, -24.341109), (21.576804, -22.751344), (20.985387, -21.980647), (20.831176, -21.793257)],
                knots=[0, 0, 0, 0, 0, 1, 1, 1, 1, 1], degree=4))
            Line((20.831176, -21.793257), (20.270426, -21.203563))
            ThreePointArc((20.270426, -21.203563), (19.95342, -20.41018), (20.274619, -19.618485))
            ThreePointArc((20.274619, -19.618485), (20.681226, -19.189373), (21.078752, -18.751836))
            ThreePointArc((21.078752, -18.751836), (21.84423, -18.372372), (22.659084, -18.629202))
            Line((22.659084, -18.629202), (23.289034, -19.144315))
            add(Edge.make_bspline(
                [(23.289034, -19.144315), (23.487425, -19.284092), (24.300163, -19.816261), (25.94023, -20.428003), (28.366523, -20.629637)],
                knots=[0, 0, 0, 0, 0, 1, 1, 1, 1, 1], degree=4))
            ThreePointArc((28.366523, -20.629637), (28.980159, -19.758338), (29.567042, -18.868799))
            add(Edge.make_bspline(
                [(29.567042, -18.868799), (28.492921, -16.683892), (27.324283, -15.380691), (26.531974, -14.818557), (26.32938, -14.684947)],
                knots=[0, 0, 0, 0, 0, 1, 1, 1, 1, 1], degree=4))
            Line((26.32938, -14.684947), (25.619728, -14.286735))
            ThreePointArc((25.619728, -14.286735), (25.082952, -13.622039), (25.156525, -12.770842))
            ThreePointArc((25.156525, -12.770842), (25.418584, -12.240945), (25.669483, -11.705673))
            ThreePointArc((25.669483, -11.705673), (26.289104, -11.117439), (27.143458, -11.122676))
            Line((27.143458, -11.122676), (27.897254, -11.429224))
            add(Edge.make_bspline(
                [(27.897254, -11.429224), (28.12803, -11.504313), (29.06152, -11.773281), (30.809038, -11.874427), (33.18697, -11.351941)],
                knots=[0, 0, 0, 0, 0, 1, 1, 1, 1, 1], degree=4))
            ThreePointArc((33.18697, -11.351941), (33.516524, -10.338478), (33.815137, -9.315472))
            add(Edge.make_bspline(
                [(33.815137, -9.315472), (32.144724, -7.544237), (30.64388, -6.643396), (29.72108, -6.339774), (29.488104, -6.271815)],
                knots=[0, 0, 0, 0, 0, 1, 1, 1, 1, 1], degree=4))
            Line((29.488104, -6.271815), (28.692604, -6.100468))
            ThreePointArc((28.692604, -6.100468), (27.983753, -5.62352), (27.803163, -4.788454))
            ThreePointArc((27.803163, -4.788454), (27.89739, -4.204855), (27.979368, -3.61941))
            ThreePointArc((27.979368, -3.61941), (28.398075, -2.874673), (29.216017, -2.627852))
        make_face()
    extrude(amount=PAD_DEPTH)

    # Cut: cut hole
    add(hole.part, mode=Mode.SUBTRACT)

    # Cut002: cut gearcutter_d
    add(gearcutter_d.part, mode=Mode.SUBTRACT)


with BuildPart() as clone_of_pad002:
    # Sketch001 → Pad001 (new body)
    with BuildSketch(Plane.XY):
        with BuildLine():
            Line((20.522763, 10), (-20, 10))
            Line((-20, 10), (-20, 40))
            Line((-20, 40), (-12.44178, 46.907085))
            Line((-12.44178, 63.085703), (-12.44178, 46.907085))
            ThreePointArc((-3.272439, 119.933259), (-16.862004, 92.961944), (-12.44178, 63.085703))
            Line((12.5, 119.933259), (-3.272439, 119.933259))
            Line((12.5, 119.933259), (12.5, 114.933259))
            ThreePointArc((12.5, 114.933259), (-3.21942, 80.514127), (20.522763, 51.050835))
            Line((20.522763, 51.050835), (20.522763, 10))
        make_face()
    extrude(amount=PAD001_DEPTH)


with BuildPart() as pince_d:
    # Part__Mirroring: instance of Clone of Pad002
    add(clone_of_pad002.part.mirror(Plane(origin=(0, 0, 0), x_dir=(0, -1, 0), z_dir=(1, 0, 0))))

    # Fusion001: union Cut002
    add(cut002.part)


solid = pince_d.part
